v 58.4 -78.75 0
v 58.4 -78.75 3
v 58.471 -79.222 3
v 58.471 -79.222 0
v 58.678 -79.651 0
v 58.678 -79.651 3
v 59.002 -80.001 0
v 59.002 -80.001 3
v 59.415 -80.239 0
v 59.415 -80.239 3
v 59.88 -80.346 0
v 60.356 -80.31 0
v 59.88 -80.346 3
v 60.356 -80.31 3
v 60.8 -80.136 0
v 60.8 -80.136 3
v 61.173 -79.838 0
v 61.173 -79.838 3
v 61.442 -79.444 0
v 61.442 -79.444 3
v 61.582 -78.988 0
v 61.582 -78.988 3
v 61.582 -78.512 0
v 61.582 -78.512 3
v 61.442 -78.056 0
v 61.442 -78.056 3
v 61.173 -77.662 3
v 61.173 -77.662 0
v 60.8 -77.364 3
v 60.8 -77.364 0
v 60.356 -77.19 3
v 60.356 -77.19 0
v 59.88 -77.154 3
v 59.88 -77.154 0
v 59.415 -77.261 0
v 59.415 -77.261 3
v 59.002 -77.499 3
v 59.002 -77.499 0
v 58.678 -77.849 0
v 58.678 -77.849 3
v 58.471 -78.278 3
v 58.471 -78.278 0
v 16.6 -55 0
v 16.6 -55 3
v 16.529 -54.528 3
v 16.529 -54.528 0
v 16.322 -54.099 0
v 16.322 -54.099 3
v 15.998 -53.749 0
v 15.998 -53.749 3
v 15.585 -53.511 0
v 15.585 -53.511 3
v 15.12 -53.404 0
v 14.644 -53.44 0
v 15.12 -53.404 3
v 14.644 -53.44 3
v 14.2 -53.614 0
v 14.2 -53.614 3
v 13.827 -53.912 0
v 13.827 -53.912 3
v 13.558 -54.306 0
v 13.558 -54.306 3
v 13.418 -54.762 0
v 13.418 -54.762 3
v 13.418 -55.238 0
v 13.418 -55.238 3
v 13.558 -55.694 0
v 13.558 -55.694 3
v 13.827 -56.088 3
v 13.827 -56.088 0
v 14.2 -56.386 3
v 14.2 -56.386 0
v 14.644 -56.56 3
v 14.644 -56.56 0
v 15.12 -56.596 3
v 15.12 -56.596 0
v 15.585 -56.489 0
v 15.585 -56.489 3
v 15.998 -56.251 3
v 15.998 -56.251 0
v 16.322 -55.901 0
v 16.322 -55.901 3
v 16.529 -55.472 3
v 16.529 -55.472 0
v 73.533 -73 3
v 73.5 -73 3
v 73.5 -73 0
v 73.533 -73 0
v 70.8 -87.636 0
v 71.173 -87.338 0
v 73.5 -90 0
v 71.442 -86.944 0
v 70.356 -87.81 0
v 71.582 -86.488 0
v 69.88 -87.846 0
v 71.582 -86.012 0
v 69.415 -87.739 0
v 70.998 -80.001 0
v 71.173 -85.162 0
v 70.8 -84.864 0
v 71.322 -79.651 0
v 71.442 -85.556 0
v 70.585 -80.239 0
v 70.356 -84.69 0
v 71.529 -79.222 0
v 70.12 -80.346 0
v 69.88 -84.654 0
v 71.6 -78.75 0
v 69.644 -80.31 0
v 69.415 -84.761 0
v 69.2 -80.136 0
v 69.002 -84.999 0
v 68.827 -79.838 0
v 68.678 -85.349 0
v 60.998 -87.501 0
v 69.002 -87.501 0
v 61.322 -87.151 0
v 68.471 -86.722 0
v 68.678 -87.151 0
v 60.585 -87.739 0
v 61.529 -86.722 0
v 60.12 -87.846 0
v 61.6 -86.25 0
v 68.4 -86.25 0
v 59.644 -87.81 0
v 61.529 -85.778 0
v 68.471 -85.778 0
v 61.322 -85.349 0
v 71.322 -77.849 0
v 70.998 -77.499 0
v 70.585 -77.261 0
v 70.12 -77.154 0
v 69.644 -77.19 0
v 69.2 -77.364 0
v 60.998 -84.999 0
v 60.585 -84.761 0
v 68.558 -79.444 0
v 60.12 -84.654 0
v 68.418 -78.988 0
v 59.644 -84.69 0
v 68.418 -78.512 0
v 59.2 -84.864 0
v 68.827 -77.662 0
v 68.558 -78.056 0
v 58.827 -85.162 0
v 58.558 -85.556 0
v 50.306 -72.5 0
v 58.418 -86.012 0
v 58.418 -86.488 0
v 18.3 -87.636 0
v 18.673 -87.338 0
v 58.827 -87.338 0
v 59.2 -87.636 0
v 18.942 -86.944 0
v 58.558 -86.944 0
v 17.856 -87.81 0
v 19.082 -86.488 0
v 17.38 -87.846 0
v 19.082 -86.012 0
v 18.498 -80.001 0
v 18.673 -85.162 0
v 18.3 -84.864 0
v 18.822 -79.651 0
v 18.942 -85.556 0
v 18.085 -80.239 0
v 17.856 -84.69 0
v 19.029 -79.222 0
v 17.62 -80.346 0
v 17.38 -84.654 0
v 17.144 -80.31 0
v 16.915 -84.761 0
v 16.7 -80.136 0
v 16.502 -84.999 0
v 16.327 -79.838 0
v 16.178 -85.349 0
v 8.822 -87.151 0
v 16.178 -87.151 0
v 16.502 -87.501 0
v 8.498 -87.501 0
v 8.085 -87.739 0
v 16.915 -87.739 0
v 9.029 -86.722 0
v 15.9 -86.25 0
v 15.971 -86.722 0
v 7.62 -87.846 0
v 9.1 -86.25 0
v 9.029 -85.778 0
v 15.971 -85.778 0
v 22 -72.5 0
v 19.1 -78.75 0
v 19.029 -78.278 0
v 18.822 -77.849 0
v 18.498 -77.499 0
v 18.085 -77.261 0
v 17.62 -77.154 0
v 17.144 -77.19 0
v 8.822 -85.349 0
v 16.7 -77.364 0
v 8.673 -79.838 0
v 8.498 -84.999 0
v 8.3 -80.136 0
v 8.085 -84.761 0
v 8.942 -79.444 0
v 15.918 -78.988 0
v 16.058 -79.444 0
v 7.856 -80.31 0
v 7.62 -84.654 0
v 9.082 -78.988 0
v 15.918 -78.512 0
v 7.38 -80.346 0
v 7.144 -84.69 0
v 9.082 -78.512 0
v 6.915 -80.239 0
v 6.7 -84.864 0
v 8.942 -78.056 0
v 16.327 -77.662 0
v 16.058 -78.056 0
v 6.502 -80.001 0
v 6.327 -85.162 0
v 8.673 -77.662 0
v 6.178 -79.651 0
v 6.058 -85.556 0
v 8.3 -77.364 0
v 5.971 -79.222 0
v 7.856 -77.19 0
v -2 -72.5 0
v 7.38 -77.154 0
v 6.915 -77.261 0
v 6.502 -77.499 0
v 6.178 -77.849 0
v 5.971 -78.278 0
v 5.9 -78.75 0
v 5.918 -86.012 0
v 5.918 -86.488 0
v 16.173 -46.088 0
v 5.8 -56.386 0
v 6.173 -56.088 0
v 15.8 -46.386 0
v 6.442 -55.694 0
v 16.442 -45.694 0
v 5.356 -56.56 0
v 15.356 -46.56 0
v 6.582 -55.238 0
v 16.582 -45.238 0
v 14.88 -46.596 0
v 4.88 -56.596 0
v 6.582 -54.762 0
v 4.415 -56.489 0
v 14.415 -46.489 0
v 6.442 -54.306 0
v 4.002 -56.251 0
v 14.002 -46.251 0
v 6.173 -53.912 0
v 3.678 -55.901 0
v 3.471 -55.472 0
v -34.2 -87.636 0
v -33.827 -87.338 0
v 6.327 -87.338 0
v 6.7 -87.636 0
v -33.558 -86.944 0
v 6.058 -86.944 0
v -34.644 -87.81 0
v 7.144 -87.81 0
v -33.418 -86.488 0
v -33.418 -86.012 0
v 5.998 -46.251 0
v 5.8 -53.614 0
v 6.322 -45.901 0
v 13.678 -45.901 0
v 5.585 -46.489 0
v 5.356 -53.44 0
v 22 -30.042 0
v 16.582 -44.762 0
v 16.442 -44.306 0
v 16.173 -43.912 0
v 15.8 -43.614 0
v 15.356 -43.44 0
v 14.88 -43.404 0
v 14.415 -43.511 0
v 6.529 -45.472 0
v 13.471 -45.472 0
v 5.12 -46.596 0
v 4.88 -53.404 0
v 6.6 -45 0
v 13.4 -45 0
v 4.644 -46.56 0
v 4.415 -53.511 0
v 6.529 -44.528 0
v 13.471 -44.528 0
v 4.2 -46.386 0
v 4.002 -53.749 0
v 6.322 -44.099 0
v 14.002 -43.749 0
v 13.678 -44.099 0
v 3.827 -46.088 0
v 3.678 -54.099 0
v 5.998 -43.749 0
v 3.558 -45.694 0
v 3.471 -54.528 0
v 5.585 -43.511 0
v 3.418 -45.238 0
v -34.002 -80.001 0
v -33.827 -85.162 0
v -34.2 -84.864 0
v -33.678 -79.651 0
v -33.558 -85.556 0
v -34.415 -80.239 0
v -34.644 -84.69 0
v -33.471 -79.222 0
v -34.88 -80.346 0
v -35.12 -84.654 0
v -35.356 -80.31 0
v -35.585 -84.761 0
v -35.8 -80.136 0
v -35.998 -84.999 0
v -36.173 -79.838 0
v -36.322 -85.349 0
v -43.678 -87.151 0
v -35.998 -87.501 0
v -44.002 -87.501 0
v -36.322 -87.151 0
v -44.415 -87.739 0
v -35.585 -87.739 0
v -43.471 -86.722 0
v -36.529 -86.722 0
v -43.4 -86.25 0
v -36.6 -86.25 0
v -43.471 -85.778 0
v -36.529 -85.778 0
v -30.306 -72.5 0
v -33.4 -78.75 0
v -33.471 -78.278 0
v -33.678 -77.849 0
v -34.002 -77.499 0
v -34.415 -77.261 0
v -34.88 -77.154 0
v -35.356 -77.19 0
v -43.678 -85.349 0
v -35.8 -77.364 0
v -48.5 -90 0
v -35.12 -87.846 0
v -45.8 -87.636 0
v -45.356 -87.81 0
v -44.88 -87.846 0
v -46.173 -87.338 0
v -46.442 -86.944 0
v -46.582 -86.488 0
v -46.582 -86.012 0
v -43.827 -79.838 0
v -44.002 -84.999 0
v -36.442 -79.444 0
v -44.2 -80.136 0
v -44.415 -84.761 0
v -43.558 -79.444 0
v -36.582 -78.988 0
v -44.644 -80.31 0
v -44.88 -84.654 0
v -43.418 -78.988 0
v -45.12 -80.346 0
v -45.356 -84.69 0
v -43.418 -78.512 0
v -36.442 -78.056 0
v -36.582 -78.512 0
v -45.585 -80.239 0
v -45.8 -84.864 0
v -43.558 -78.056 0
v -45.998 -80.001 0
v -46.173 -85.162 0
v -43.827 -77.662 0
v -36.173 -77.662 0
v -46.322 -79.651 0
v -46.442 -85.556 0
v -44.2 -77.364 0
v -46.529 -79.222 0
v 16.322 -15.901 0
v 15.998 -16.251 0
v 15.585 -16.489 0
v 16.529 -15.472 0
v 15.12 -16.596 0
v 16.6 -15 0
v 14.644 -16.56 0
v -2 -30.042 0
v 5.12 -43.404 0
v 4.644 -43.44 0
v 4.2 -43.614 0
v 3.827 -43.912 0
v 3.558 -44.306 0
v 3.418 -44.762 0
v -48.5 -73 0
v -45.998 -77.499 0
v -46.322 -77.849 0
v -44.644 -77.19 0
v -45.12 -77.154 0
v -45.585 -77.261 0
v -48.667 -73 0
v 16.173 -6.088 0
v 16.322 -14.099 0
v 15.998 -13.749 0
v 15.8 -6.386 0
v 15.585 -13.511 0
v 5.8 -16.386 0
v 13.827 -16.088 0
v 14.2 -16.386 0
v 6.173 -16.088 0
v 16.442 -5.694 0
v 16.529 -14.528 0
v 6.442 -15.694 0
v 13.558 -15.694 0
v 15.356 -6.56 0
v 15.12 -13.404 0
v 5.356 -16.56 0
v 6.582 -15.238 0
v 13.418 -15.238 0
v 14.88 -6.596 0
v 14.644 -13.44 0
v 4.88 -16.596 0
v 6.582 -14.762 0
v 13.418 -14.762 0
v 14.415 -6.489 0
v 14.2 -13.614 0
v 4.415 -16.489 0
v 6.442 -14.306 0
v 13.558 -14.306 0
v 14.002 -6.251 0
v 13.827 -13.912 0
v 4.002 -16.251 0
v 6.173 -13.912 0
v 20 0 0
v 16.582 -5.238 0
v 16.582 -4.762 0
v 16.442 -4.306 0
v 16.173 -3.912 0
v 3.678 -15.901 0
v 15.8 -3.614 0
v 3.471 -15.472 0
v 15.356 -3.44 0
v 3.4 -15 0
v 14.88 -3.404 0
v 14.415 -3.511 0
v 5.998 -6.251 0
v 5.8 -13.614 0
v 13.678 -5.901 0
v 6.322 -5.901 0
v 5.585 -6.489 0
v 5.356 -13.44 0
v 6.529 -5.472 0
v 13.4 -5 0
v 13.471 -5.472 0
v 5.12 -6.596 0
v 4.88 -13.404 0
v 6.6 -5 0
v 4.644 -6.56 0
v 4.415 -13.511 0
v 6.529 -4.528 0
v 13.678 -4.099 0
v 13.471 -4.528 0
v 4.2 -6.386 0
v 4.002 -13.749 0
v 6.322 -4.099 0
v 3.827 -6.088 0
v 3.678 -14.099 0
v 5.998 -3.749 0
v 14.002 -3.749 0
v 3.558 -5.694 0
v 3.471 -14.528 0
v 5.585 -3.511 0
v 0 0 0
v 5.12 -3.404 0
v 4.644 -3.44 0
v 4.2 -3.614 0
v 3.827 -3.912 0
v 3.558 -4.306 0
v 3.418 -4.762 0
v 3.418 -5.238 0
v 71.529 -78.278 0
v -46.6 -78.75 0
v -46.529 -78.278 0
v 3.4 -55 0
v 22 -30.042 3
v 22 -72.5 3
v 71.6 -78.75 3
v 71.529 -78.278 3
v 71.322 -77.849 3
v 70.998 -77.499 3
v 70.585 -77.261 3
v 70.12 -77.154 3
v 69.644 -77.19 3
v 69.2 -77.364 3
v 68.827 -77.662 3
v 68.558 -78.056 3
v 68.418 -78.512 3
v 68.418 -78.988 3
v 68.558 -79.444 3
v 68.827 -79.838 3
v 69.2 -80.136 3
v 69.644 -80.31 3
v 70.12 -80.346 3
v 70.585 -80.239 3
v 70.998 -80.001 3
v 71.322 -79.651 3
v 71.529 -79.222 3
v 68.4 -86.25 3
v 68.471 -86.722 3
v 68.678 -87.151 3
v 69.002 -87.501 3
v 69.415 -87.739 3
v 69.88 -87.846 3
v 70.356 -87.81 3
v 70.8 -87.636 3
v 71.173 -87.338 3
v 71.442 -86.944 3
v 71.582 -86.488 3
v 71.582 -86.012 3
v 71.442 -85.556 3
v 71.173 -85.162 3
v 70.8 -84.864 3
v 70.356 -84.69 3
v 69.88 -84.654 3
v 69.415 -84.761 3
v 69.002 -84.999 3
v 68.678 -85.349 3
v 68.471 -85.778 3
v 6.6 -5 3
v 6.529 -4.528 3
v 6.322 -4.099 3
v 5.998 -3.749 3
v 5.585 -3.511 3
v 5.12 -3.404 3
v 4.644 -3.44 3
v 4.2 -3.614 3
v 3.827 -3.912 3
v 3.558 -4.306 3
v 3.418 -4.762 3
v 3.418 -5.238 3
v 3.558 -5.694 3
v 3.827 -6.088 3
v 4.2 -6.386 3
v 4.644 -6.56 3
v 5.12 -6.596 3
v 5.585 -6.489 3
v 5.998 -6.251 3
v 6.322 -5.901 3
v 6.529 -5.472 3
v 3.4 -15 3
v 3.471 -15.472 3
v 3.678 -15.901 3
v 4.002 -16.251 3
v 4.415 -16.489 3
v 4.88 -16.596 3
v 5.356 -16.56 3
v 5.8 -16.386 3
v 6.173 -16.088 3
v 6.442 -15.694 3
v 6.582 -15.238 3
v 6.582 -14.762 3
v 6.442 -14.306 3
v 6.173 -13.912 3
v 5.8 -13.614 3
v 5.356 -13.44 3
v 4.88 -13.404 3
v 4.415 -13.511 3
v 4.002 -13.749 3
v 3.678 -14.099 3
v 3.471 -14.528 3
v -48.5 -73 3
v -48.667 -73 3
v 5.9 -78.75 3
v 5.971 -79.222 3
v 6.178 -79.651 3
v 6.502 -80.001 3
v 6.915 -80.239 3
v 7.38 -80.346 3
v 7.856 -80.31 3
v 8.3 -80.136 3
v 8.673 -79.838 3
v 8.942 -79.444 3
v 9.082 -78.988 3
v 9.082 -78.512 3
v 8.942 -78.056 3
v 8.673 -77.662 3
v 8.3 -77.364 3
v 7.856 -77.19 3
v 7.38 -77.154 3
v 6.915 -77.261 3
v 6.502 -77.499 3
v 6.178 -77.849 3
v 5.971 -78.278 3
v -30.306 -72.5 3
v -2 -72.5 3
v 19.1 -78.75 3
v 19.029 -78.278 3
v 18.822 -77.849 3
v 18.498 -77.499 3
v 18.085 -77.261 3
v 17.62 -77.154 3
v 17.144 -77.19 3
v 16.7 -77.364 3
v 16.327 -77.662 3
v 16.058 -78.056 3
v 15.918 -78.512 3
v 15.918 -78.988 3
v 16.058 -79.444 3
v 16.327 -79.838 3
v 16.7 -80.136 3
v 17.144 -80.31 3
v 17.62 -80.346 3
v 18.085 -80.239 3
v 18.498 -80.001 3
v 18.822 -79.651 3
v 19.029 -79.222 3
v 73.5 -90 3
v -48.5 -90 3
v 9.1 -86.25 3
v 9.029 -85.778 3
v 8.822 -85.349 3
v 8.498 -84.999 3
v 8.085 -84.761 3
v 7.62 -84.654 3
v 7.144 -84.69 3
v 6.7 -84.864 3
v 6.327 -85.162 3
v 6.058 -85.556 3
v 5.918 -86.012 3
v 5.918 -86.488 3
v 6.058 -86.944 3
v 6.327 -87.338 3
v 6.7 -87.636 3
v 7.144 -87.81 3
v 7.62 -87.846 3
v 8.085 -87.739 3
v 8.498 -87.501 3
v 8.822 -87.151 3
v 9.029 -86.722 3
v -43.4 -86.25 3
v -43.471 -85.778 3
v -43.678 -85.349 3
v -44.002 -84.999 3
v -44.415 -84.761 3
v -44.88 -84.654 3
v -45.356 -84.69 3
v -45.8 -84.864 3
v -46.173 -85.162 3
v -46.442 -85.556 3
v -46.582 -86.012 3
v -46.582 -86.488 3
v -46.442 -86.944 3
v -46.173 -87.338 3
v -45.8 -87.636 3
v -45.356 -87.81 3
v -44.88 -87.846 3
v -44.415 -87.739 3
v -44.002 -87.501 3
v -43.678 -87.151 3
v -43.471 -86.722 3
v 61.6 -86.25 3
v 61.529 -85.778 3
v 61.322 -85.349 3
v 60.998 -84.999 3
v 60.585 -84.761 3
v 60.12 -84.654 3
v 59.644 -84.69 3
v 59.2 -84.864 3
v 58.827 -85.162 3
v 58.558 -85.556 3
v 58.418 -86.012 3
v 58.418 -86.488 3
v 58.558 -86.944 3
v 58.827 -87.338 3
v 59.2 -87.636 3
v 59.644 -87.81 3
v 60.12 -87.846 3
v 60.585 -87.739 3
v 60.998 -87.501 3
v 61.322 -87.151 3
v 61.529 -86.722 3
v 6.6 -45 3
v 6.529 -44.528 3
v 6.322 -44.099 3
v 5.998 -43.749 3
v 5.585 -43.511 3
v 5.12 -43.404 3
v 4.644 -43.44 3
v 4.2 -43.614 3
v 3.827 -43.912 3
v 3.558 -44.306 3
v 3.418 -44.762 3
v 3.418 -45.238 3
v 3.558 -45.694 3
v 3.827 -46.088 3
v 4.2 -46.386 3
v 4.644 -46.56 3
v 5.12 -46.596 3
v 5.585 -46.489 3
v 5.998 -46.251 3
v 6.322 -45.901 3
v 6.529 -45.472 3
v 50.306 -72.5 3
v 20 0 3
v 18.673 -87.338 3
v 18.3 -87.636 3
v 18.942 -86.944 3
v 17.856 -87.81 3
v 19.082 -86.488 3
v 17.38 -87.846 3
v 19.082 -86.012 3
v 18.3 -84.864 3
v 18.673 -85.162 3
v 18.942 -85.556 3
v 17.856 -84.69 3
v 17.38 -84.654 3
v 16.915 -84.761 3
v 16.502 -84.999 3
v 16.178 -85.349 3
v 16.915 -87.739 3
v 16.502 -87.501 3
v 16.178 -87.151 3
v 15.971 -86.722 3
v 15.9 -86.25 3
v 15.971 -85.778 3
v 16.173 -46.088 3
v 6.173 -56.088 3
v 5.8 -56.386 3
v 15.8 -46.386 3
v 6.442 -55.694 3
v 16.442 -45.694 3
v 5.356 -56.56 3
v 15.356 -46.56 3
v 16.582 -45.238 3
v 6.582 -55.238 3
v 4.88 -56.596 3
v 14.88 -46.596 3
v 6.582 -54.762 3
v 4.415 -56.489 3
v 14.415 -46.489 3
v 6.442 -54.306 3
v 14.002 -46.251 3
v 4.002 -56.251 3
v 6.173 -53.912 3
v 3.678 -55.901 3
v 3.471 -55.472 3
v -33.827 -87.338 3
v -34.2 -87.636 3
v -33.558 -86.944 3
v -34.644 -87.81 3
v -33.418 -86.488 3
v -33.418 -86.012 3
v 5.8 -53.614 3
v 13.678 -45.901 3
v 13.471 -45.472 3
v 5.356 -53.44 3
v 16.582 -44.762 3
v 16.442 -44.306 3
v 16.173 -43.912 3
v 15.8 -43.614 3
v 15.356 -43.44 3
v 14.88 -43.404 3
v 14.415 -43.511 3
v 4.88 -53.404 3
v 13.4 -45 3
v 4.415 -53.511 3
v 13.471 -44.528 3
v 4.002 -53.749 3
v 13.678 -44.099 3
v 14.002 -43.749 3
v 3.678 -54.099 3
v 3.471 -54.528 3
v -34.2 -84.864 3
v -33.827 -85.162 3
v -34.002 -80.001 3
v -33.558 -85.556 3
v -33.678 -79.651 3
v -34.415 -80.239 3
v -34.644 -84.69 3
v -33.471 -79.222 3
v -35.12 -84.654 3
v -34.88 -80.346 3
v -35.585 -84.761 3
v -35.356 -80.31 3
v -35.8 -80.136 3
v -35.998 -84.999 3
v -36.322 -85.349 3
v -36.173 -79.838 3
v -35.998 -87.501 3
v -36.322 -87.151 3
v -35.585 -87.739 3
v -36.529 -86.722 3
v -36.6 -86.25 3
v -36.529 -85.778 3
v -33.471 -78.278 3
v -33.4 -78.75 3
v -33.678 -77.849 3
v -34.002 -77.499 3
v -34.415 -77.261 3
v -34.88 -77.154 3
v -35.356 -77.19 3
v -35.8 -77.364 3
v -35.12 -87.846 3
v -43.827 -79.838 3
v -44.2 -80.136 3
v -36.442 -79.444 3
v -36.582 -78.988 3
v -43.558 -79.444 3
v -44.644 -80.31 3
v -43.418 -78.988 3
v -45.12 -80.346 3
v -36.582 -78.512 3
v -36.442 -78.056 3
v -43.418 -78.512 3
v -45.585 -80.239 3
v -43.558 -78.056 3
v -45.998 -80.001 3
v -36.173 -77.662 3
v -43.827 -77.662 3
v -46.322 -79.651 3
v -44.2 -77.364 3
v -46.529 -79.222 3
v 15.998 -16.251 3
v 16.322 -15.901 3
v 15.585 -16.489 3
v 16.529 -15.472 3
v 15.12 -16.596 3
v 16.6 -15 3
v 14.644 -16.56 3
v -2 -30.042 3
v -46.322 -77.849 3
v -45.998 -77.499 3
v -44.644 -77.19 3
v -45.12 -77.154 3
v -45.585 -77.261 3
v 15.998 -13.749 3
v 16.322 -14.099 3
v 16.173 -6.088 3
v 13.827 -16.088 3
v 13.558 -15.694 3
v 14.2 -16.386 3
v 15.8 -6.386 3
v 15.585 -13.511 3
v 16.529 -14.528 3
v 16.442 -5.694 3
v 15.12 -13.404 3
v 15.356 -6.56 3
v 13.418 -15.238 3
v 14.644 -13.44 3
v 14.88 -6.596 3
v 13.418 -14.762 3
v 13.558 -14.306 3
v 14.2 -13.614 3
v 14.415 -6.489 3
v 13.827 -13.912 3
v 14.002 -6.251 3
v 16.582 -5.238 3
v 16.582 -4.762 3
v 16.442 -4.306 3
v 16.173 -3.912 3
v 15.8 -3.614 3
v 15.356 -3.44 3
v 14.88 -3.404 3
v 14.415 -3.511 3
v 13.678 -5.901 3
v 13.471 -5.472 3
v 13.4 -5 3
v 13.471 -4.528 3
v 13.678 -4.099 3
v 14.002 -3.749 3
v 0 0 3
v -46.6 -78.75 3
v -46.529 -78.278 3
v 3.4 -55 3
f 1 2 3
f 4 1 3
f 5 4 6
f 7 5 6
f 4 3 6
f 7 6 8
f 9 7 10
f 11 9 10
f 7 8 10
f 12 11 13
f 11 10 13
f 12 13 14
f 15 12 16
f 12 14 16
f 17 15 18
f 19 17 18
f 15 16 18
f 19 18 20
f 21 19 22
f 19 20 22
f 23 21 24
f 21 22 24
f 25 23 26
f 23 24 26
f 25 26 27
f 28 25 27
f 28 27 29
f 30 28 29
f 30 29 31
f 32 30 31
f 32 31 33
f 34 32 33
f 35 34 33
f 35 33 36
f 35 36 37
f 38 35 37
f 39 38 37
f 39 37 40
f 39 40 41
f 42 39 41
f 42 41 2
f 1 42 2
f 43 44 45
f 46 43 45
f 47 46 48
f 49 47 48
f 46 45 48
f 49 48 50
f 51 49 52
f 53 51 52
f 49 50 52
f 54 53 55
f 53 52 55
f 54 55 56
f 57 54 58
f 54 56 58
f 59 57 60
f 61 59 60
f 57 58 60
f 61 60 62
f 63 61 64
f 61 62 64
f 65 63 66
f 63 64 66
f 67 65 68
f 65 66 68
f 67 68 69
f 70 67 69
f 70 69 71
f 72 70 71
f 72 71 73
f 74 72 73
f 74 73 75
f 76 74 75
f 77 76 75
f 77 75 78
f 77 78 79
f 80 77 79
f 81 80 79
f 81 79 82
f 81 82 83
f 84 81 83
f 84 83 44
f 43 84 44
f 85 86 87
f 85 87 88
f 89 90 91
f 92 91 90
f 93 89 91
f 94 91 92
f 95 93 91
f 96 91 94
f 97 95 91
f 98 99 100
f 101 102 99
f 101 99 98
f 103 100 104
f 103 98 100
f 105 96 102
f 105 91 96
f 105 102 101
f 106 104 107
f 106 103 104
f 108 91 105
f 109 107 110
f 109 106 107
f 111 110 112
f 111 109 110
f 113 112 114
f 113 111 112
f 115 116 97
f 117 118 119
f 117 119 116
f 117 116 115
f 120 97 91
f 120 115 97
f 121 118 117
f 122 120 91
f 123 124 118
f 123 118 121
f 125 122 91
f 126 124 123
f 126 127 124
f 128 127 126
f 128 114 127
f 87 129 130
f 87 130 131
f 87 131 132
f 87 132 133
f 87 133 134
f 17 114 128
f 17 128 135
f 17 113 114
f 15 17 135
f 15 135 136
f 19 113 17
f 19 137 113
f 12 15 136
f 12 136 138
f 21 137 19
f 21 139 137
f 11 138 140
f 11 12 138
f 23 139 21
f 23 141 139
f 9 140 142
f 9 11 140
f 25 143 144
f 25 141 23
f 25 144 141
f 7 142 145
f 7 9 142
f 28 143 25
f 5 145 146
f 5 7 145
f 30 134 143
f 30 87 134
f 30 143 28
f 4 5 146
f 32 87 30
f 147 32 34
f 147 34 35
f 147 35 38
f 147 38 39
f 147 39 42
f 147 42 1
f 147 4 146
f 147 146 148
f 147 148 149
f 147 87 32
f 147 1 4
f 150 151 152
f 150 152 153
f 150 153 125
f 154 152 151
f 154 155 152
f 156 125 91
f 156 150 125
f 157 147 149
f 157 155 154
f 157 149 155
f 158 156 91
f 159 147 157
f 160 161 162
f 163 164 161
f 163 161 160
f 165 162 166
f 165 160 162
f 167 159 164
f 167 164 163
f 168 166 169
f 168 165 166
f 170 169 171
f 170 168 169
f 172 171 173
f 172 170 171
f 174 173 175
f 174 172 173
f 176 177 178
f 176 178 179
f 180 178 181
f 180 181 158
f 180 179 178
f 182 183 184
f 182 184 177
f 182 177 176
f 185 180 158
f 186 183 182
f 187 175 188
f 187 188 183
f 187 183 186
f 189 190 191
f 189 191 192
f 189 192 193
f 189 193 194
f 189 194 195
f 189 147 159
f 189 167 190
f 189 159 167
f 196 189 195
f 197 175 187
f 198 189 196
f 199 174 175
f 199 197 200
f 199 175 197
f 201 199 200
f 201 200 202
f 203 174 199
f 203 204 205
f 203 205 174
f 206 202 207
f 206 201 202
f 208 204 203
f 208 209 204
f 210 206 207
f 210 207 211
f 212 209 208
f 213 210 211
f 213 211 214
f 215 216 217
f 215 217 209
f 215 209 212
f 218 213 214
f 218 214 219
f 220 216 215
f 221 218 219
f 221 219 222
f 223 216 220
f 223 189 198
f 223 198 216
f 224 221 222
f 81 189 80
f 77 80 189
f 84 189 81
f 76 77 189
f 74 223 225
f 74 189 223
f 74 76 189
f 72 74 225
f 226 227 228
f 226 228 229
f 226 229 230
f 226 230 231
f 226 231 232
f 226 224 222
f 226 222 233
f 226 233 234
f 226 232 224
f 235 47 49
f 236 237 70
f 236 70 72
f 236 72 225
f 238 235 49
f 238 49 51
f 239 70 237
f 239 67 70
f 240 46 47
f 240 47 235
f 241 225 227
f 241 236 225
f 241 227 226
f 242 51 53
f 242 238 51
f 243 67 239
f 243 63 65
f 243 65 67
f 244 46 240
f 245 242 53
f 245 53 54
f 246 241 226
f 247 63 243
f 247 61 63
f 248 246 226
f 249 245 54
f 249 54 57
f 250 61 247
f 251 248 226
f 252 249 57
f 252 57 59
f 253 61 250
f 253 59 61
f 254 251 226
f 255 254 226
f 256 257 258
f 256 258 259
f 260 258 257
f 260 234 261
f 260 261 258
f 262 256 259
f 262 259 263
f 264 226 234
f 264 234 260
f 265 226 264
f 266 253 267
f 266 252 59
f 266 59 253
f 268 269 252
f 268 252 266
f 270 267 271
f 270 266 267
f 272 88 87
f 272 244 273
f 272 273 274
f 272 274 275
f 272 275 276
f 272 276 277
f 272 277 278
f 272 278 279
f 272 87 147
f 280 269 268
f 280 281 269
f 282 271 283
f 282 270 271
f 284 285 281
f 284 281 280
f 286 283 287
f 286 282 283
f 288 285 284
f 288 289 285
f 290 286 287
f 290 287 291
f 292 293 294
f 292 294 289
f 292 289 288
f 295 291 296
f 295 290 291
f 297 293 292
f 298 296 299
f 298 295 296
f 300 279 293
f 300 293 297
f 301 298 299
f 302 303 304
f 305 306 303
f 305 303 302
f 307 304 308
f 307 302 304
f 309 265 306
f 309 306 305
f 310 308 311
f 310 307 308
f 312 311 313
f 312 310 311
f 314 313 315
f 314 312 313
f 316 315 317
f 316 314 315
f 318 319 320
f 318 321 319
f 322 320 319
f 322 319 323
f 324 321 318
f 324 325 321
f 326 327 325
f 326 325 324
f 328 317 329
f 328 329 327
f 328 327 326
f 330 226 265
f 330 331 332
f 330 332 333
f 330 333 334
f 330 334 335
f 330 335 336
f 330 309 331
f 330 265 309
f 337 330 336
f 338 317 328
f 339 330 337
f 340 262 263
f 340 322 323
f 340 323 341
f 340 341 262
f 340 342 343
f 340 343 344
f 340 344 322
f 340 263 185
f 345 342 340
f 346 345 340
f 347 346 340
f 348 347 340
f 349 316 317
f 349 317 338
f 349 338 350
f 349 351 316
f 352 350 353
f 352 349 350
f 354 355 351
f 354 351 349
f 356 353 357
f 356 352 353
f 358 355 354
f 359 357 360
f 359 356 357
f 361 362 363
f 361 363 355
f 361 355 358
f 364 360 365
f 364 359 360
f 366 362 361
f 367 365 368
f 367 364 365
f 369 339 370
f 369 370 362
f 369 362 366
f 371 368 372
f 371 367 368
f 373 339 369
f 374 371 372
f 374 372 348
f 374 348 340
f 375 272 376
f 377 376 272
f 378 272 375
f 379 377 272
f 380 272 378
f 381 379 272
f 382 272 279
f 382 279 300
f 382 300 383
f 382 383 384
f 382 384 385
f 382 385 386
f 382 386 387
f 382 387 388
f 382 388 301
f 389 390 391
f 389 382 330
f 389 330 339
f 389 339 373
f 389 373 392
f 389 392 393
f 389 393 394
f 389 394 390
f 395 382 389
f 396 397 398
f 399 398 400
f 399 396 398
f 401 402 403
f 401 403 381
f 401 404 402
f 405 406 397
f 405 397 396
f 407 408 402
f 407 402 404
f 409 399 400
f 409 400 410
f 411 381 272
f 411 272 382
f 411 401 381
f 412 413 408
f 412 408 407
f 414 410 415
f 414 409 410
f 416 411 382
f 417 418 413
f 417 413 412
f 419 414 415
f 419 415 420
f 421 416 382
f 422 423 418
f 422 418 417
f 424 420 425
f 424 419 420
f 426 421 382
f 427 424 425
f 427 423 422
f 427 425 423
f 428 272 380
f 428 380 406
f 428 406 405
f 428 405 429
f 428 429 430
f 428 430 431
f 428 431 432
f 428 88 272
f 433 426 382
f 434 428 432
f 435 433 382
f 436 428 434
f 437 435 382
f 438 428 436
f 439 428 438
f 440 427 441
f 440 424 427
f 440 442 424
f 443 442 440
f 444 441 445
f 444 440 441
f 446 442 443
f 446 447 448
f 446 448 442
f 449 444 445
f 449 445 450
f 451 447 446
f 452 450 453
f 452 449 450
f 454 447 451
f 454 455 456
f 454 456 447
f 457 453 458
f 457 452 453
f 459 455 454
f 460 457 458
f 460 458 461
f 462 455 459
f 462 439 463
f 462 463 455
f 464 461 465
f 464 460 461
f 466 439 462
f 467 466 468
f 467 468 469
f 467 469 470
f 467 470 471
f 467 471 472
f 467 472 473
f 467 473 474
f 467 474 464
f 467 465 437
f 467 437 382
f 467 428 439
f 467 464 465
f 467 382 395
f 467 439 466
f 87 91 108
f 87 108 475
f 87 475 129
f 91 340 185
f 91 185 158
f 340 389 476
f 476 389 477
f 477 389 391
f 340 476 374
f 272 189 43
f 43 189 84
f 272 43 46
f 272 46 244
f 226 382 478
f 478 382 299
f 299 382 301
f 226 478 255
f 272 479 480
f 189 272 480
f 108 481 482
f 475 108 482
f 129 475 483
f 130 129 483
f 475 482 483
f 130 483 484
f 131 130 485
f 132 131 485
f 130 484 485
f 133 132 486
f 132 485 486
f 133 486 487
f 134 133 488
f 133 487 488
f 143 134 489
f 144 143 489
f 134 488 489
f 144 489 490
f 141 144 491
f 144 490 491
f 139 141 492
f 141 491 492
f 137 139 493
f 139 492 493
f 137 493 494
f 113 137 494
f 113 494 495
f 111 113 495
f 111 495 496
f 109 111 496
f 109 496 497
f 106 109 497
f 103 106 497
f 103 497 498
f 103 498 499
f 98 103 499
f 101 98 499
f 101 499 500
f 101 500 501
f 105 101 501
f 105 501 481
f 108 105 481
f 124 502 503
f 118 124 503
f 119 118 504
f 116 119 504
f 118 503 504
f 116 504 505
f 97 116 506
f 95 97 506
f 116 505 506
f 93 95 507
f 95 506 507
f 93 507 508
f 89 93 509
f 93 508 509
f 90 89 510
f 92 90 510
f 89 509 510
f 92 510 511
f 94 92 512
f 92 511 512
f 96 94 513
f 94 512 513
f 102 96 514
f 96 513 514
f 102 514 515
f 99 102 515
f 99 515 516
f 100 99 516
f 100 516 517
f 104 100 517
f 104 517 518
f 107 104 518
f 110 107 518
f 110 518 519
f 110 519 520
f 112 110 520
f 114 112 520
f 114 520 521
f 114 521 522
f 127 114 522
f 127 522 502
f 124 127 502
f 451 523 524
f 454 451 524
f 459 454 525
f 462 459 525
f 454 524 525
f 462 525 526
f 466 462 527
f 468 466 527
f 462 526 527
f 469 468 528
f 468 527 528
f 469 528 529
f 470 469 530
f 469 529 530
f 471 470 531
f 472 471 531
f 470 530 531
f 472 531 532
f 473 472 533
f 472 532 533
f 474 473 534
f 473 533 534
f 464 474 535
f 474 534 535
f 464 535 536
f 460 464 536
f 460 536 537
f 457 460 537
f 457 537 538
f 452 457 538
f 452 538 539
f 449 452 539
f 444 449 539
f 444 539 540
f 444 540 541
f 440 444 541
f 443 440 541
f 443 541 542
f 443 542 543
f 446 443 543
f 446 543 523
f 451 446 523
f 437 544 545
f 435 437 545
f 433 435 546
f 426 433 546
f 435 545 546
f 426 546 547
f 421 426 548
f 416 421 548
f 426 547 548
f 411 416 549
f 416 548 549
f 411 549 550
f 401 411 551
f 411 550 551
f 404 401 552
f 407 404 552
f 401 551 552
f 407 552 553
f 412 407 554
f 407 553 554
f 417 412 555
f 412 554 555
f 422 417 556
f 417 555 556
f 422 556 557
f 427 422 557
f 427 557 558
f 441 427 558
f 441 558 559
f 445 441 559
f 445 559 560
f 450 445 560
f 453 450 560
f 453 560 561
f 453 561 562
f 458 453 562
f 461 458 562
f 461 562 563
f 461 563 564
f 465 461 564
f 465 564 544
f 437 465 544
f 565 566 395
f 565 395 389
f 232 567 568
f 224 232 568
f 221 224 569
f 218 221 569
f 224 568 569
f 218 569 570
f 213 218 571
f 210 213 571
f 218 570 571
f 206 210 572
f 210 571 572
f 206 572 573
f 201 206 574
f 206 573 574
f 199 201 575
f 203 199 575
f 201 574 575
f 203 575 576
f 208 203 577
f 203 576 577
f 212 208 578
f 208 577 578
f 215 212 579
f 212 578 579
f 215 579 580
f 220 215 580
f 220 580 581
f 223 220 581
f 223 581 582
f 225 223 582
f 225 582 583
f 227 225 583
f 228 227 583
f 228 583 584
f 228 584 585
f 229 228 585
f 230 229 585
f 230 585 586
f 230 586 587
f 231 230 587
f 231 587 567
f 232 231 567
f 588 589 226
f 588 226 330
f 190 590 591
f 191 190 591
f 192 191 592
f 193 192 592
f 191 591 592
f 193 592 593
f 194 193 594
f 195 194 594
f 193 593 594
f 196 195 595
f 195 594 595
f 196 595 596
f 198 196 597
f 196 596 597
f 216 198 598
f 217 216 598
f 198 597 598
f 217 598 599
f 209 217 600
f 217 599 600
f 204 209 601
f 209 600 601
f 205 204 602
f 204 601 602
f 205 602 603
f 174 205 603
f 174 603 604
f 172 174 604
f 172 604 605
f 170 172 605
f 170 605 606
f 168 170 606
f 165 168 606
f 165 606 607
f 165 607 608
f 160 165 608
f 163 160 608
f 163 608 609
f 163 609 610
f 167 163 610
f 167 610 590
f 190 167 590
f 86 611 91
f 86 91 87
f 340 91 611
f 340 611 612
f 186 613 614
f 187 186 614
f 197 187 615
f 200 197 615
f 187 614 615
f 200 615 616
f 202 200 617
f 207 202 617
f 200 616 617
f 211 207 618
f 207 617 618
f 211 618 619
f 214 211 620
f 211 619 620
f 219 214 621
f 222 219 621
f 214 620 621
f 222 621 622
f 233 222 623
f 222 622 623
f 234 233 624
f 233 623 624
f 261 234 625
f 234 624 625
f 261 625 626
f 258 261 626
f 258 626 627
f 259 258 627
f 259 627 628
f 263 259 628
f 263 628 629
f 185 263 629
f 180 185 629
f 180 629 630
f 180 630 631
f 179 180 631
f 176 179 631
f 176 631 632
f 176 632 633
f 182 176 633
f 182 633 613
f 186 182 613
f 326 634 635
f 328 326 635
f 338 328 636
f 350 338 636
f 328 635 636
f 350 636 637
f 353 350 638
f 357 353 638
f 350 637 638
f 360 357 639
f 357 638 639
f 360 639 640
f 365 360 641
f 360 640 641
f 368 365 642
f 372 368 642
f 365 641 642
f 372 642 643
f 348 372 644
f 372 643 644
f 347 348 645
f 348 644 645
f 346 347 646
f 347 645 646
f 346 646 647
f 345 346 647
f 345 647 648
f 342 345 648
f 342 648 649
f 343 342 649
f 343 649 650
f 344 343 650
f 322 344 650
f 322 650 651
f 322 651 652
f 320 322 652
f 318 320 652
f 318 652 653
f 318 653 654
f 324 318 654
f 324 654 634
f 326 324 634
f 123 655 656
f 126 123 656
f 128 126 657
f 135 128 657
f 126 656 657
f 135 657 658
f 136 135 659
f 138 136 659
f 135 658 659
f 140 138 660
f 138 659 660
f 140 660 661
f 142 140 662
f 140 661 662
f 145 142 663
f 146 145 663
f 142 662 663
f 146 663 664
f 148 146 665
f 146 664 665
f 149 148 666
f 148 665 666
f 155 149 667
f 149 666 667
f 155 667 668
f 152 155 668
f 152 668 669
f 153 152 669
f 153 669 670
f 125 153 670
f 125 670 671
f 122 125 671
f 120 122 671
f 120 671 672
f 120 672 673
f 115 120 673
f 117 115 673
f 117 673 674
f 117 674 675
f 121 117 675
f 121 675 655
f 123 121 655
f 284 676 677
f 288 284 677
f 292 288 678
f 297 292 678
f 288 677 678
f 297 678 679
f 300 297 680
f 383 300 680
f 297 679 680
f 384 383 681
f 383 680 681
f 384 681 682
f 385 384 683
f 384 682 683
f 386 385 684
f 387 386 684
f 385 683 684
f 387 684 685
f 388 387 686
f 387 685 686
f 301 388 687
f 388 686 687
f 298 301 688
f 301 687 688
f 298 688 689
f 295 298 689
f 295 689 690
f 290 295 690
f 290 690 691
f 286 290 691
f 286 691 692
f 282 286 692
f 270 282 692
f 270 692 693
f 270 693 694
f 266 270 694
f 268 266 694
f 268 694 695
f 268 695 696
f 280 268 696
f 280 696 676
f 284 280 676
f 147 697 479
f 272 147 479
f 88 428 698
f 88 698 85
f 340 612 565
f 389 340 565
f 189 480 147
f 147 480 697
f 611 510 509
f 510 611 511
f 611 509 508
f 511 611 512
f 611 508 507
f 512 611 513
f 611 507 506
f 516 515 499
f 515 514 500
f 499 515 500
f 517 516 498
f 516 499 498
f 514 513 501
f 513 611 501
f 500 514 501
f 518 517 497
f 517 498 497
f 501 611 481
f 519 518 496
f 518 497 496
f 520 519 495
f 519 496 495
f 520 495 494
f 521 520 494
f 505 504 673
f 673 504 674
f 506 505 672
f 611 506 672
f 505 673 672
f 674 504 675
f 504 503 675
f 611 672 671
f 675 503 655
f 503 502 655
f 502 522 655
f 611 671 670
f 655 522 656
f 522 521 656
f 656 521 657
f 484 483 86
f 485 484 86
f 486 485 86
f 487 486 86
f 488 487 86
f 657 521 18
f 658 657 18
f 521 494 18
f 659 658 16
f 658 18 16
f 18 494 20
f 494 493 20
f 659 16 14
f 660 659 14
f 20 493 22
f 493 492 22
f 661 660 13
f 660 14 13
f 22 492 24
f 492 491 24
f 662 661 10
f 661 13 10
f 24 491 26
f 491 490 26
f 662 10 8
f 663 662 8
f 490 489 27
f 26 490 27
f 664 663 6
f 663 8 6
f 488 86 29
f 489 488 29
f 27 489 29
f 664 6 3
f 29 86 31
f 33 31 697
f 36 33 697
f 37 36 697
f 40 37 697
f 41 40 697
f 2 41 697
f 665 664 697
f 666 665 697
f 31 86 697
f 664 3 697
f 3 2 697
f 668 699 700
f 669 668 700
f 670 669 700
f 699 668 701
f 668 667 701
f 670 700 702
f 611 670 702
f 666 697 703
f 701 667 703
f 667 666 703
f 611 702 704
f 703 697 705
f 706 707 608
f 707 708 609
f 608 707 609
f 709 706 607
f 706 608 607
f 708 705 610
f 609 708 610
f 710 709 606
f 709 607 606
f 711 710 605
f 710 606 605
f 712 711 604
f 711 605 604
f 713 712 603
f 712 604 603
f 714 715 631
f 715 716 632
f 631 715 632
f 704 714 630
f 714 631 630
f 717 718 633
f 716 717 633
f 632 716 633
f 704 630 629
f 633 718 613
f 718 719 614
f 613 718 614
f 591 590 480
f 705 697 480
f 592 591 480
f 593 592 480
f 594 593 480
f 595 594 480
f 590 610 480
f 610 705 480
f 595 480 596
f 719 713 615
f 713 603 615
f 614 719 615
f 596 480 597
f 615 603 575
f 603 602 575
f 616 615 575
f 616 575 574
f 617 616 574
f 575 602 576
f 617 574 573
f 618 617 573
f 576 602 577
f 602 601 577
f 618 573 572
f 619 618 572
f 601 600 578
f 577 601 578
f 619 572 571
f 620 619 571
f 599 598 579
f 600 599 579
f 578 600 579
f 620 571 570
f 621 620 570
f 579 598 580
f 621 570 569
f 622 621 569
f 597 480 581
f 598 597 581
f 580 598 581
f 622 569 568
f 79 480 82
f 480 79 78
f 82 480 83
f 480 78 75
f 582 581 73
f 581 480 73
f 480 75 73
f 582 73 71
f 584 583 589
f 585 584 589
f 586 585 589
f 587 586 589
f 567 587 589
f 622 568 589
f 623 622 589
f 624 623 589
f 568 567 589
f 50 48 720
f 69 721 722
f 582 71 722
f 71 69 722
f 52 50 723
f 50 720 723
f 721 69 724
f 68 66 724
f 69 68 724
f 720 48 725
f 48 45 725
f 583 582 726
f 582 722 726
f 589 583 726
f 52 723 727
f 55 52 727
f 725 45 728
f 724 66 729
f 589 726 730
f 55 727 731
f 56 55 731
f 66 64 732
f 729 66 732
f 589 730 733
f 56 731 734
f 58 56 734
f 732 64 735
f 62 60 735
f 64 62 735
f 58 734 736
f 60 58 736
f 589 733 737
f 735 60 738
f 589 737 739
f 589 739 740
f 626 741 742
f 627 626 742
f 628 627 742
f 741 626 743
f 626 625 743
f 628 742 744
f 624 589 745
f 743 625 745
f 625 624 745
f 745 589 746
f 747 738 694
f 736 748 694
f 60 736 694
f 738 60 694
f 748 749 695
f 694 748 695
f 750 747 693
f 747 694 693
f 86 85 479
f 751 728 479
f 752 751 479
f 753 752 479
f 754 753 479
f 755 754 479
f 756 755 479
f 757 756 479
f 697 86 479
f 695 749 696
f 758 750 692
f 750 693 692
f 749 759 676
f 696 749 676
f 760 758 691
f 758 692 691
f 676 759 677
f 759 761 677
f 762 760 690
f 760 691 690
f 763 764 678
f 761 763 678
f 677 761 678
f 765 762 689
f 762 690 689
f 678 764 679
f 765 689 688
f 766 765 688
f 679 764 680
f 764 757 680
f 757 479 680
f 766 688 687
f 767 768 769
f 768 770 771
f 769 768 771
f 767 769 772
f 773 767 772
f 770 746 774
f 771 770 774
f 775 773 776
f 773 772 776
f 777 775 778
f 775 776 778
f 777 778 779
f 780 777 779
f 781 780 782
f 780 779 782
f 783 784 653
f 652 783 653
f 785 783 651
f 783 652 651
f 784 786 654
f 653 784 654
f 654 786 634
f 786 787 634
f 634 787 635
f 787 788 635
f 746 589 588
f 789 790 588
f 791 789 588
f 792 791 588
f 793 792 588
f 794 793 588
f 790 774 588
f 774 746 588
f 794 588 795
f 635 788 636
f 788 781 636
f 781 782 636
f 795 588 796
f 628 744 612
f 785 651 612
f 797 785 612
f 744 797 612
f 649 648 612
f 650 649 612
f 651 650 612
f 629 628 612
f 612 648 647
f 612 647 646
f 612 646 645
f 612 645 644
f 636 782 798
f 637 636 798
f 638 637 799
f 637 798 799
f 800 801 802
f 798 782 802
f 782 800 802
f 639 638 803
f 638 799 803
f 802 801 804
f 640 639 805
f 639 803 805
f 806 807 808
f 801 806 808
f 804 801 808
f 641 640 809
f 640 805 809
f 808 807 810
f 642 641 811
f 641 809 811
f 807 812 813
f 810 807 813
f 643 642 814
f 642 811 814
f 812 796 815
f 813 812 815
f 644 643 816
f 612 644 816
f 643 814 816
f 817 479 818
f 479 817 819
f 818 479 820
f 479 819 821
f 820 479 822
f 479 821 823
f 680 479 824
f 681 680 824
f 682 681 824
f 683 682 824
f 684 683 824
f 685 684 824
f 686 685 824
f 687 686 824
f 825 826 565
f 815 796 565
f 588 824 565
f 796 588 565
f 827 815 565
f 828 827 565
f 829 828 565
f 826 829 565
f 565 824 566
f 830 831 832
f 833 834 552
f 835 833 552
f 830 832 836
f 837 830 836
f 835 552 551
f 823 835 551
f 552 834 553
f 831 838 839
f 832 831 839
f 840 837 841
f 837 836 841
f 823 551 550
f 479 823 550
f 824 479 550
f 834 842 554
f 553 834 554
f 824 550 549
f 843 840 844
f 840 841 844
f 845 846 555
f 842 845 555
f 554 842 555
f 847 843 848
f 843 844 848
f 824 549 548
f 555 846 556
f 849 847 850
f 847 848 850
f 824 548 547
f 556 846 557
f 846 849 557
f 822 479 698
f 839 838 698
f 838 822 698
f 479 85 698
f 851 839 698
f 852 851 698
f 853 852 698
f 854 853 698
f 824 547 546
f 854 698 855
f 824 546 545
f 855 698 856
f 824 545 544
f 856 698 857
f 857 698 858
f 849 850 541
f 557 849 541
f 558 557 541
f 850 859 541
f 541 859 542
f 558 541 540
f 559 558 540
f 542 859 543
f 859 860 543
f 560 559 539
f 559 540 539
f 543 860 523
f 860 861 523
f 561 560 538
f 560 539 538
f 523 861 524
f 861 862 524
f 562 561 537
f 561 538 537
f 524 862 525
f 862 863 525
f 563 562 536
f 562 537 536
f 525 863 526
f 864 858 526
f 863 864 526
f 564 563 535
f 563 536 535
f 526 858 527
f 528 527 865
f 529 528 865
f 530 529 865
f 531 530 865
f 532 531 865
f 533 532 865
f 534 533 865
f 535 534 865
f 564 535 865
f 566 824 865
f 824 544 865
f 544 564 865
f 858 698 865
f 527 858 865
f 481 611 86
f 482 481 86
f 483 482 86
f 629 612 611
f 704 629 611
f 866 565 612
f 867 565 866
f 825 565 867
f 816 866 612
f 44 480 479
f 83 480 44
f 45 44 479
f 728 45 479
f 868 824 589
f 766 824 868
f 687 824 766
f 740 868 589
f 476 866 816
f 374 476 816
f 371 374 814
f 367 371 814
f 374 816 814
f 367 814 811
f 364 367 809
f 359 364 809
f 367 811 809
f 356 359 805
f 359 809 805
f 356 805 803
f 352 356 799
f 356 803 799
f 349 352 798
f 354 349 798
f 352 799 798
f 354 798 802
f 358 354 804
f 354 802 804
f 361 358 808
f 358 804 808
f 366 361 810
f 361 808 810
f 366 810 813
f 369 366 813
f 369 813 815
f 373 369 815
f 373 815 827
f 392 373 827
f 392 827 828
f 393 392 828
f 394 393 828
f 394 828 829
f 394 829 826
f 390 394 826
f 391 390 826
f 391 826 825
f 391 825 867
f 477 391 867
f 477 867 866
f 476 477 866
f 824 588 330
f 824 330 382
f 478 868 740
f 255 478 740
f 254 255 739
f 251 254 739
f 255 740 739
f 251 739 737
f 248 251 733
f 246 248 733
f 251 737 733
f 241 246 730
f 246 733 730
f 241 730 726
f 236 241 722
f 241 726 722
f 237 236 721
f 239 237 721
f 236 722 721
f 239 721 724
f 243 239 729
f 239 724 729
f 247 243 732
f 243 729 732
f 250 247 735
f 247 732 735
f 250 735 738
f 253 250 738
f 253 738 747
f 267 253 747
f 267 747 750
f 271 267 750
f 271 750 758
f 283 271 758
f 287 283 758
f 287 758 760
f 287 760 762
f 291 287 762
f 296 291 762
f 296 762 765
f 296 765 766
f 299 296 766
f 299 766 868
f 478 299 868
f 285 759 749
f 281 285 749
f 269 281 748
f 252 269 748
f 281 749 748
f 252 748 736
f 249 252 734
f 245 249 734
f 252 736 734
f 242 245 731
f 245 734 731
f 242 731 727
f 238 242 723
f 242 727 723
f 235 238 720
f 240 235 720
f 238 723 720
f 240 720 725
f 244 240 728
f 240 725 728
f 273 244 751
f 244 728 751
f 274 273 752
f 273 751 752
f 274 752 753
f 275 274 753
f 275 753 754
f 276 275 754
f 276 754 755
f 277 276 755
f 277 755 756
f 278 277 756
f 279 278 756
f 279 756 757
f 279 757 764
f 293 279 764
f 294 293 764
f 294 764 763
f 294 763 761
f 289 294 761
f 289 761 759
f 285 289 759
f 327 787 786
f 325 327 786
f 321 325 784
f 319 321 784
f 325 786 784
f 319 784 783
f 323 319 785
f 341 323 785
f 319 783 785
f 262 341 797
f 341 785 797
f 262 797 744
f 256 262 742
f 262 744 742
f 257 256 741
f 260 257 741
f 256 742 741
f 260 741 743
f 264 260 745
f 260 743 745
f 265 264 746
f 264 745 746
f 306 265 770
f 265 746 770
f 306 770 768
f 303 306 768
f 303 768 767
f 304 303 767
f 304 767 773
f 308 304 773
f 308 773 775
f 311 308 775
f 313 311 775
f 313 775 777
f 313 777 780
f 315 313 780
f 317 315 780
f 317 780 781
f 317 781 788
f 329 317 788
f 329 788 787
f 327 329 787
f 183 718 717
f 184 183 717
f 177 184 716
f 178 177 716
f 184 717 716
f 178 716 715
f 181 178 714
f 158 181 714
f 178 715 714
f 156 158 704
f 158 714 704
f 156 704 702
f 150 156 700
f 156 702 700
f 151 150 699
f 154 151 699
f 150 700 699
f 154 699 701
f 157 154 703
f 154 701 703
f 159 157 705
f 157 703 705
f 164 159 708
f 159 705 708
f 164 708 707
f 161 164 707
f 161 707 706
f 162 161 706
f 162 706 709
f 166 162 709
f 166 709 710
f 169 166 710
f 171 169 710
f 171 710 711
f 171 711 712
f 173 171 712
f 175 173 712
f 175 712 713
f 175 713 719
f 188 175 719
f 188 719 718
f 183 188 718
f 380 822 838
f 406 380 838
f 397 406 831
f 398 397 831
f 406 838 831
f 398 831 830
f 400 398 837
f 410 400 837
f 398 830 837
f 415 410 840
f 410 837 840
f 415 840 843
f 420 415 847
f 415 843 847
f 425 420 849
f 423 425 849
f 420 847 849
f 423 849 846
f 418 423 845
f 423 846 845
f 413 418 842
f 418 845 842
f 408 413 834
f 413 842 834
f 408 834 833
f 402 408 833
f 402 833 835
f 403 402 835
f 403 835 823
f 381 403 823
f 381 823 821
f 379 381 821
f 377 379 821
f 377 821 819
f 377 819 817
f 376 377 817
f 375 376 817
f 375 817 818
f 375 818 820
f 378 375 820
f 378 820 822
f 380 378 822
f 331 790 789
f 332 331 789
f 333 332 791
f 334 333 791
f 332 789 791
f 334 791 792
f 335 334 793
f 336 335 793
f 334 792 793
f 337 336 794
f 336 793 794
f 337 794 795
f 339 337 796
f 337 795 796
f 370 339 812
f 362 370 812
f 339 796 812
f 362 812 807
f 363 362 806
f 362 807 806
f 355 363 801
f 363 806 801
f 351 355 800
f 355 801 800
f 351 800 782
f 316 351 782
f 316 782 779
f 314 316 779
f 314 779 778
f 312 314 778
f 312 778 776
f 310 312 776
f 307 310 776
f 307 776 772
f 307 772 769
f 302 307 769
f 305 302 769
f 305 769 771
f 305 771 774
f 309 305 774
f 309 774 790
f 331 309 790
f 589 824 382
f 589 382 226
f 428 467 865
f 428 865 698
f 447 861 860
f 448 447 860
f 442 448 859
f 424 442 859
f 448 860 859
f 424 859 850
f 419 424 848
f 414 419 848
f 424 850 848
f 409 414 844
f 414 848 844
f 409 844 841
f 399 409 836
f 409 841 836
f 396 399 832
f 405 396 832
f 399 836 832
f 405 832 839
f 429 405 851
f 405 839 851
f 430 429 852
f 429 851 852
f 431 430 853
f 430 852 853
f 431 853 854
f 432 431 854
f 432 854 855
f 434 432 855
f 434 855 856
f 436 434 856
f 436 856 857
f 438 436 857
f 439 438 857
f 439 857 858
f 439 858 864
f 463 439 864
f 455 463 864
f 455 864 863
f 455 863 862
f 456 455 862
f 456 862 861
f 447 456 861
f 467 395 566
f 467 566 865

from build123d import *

# Parameters (mm, degrees)
EXTRUDE_1_DEPTH     = 3
SKETCH_2_R          = 1.6
SKETCH_2_W          = 1.5
SKETCH_2_H          = 17
CUT_EXTRUDE_1_DEPTH = 118.192149908


with BuildPart() as part:
    # 草图1 → 凸台-拉伸1 (new body)
    with BuildSketch(Plane.XY):
        Polygon((0, 0), (20, 0), (75, -75), (75, -90), (-50, -90), (-50, -75), align=None)
    extrude(amount=EXTRUDE_1_DEPTH)

    # 草图2 → 切除-拉伸1 (cut, through all)
    with BuildSketch(Plane.XY.offset(3)):
        with Locations((5, -5)):
            Circle(SKETCH_2_R)
        with Locations(Location((15, -5, 0), (0, 0, 180))):
            Circle(SKETCH_2_R)
        with Locations((15, -15)):
            Circle(SKETCH_2_R)
        with Locations(Location((5, -15, 0), (0, 0, 180))):
            Circle(SKETCH_2_R)
        with Locations((-45, -86.25)):
            Circle(SKETCH_2_R)
        with Locations(Location((-45, -78.75, 0), (0, 0, 180))):
            Circle(SKETCH_2_R)
        with Locations(Location((-35, -86.25, 0), (0, 0, 180))):
            Circle(SKETCH_2_R)
        with Locations((-35, -78.75)):
            Circle(SKETCH_2_R)
        with Locations(Location((60, -78.75, 0), (0, 0, 180))):
            Circle(SKETCH_2_R)
        with Locations((60, -86.25)):
            Circle(SKETCH_2_R)
        with Locations((70, -78.75)):
            Circle(SKETCH_2_R)
        with Locations(Location((70, -86.25, 0), (0, 0, 180))):
            Circle(SKETCH_2_R)
        with Locations((7.5, -86.25)):
            Circle(SKETCH_2_R)
        with Locations(Location((17.5, -86.25, 0), (0, 0, 180))):
            Circle(SKETCH_2_R)
        with Locations((17.5, -78.75)):
            Circle(SKETCH_2_R)
        with Locations(Location((7.5, -78.75, 0), (0, 0, 180))):
            Circle(SKETCH_2_R)
        with Locations((5, -45)):
            Circle(SKETCH_2_R)
        with Locations(Location((15, -45, 0), (0, 0, 180))):
            Circle(SKETCH_2_R)
        with Locations((15, -55)):
            Circle(SKETCH_2_R)
        with Locations(Location((5, -55, 0), (0, 0, 180))):
            Circle(SKETCH_2_R)
        Polygon((-2, -30.041634566), (-2, -72.5), (-30.305576956, -72.5), align=None)
        Polygon((22, -72.5), (50.305576956, -72.5), (22, -30.041634566), align=None)
        with Locations((74.25, -81.5)):
            Rectangle(SKETCH_2_W, SKETCH_2_H)
        with Locations((-49.25, -81.5)):
            Rectangle(SKETCH_2_W, SKETCH_2_H)
    extrude(amount=-CUT_EXTRUDE_1_DEPTH, mode=Mode.SUBTRACT)


solid = part.part
